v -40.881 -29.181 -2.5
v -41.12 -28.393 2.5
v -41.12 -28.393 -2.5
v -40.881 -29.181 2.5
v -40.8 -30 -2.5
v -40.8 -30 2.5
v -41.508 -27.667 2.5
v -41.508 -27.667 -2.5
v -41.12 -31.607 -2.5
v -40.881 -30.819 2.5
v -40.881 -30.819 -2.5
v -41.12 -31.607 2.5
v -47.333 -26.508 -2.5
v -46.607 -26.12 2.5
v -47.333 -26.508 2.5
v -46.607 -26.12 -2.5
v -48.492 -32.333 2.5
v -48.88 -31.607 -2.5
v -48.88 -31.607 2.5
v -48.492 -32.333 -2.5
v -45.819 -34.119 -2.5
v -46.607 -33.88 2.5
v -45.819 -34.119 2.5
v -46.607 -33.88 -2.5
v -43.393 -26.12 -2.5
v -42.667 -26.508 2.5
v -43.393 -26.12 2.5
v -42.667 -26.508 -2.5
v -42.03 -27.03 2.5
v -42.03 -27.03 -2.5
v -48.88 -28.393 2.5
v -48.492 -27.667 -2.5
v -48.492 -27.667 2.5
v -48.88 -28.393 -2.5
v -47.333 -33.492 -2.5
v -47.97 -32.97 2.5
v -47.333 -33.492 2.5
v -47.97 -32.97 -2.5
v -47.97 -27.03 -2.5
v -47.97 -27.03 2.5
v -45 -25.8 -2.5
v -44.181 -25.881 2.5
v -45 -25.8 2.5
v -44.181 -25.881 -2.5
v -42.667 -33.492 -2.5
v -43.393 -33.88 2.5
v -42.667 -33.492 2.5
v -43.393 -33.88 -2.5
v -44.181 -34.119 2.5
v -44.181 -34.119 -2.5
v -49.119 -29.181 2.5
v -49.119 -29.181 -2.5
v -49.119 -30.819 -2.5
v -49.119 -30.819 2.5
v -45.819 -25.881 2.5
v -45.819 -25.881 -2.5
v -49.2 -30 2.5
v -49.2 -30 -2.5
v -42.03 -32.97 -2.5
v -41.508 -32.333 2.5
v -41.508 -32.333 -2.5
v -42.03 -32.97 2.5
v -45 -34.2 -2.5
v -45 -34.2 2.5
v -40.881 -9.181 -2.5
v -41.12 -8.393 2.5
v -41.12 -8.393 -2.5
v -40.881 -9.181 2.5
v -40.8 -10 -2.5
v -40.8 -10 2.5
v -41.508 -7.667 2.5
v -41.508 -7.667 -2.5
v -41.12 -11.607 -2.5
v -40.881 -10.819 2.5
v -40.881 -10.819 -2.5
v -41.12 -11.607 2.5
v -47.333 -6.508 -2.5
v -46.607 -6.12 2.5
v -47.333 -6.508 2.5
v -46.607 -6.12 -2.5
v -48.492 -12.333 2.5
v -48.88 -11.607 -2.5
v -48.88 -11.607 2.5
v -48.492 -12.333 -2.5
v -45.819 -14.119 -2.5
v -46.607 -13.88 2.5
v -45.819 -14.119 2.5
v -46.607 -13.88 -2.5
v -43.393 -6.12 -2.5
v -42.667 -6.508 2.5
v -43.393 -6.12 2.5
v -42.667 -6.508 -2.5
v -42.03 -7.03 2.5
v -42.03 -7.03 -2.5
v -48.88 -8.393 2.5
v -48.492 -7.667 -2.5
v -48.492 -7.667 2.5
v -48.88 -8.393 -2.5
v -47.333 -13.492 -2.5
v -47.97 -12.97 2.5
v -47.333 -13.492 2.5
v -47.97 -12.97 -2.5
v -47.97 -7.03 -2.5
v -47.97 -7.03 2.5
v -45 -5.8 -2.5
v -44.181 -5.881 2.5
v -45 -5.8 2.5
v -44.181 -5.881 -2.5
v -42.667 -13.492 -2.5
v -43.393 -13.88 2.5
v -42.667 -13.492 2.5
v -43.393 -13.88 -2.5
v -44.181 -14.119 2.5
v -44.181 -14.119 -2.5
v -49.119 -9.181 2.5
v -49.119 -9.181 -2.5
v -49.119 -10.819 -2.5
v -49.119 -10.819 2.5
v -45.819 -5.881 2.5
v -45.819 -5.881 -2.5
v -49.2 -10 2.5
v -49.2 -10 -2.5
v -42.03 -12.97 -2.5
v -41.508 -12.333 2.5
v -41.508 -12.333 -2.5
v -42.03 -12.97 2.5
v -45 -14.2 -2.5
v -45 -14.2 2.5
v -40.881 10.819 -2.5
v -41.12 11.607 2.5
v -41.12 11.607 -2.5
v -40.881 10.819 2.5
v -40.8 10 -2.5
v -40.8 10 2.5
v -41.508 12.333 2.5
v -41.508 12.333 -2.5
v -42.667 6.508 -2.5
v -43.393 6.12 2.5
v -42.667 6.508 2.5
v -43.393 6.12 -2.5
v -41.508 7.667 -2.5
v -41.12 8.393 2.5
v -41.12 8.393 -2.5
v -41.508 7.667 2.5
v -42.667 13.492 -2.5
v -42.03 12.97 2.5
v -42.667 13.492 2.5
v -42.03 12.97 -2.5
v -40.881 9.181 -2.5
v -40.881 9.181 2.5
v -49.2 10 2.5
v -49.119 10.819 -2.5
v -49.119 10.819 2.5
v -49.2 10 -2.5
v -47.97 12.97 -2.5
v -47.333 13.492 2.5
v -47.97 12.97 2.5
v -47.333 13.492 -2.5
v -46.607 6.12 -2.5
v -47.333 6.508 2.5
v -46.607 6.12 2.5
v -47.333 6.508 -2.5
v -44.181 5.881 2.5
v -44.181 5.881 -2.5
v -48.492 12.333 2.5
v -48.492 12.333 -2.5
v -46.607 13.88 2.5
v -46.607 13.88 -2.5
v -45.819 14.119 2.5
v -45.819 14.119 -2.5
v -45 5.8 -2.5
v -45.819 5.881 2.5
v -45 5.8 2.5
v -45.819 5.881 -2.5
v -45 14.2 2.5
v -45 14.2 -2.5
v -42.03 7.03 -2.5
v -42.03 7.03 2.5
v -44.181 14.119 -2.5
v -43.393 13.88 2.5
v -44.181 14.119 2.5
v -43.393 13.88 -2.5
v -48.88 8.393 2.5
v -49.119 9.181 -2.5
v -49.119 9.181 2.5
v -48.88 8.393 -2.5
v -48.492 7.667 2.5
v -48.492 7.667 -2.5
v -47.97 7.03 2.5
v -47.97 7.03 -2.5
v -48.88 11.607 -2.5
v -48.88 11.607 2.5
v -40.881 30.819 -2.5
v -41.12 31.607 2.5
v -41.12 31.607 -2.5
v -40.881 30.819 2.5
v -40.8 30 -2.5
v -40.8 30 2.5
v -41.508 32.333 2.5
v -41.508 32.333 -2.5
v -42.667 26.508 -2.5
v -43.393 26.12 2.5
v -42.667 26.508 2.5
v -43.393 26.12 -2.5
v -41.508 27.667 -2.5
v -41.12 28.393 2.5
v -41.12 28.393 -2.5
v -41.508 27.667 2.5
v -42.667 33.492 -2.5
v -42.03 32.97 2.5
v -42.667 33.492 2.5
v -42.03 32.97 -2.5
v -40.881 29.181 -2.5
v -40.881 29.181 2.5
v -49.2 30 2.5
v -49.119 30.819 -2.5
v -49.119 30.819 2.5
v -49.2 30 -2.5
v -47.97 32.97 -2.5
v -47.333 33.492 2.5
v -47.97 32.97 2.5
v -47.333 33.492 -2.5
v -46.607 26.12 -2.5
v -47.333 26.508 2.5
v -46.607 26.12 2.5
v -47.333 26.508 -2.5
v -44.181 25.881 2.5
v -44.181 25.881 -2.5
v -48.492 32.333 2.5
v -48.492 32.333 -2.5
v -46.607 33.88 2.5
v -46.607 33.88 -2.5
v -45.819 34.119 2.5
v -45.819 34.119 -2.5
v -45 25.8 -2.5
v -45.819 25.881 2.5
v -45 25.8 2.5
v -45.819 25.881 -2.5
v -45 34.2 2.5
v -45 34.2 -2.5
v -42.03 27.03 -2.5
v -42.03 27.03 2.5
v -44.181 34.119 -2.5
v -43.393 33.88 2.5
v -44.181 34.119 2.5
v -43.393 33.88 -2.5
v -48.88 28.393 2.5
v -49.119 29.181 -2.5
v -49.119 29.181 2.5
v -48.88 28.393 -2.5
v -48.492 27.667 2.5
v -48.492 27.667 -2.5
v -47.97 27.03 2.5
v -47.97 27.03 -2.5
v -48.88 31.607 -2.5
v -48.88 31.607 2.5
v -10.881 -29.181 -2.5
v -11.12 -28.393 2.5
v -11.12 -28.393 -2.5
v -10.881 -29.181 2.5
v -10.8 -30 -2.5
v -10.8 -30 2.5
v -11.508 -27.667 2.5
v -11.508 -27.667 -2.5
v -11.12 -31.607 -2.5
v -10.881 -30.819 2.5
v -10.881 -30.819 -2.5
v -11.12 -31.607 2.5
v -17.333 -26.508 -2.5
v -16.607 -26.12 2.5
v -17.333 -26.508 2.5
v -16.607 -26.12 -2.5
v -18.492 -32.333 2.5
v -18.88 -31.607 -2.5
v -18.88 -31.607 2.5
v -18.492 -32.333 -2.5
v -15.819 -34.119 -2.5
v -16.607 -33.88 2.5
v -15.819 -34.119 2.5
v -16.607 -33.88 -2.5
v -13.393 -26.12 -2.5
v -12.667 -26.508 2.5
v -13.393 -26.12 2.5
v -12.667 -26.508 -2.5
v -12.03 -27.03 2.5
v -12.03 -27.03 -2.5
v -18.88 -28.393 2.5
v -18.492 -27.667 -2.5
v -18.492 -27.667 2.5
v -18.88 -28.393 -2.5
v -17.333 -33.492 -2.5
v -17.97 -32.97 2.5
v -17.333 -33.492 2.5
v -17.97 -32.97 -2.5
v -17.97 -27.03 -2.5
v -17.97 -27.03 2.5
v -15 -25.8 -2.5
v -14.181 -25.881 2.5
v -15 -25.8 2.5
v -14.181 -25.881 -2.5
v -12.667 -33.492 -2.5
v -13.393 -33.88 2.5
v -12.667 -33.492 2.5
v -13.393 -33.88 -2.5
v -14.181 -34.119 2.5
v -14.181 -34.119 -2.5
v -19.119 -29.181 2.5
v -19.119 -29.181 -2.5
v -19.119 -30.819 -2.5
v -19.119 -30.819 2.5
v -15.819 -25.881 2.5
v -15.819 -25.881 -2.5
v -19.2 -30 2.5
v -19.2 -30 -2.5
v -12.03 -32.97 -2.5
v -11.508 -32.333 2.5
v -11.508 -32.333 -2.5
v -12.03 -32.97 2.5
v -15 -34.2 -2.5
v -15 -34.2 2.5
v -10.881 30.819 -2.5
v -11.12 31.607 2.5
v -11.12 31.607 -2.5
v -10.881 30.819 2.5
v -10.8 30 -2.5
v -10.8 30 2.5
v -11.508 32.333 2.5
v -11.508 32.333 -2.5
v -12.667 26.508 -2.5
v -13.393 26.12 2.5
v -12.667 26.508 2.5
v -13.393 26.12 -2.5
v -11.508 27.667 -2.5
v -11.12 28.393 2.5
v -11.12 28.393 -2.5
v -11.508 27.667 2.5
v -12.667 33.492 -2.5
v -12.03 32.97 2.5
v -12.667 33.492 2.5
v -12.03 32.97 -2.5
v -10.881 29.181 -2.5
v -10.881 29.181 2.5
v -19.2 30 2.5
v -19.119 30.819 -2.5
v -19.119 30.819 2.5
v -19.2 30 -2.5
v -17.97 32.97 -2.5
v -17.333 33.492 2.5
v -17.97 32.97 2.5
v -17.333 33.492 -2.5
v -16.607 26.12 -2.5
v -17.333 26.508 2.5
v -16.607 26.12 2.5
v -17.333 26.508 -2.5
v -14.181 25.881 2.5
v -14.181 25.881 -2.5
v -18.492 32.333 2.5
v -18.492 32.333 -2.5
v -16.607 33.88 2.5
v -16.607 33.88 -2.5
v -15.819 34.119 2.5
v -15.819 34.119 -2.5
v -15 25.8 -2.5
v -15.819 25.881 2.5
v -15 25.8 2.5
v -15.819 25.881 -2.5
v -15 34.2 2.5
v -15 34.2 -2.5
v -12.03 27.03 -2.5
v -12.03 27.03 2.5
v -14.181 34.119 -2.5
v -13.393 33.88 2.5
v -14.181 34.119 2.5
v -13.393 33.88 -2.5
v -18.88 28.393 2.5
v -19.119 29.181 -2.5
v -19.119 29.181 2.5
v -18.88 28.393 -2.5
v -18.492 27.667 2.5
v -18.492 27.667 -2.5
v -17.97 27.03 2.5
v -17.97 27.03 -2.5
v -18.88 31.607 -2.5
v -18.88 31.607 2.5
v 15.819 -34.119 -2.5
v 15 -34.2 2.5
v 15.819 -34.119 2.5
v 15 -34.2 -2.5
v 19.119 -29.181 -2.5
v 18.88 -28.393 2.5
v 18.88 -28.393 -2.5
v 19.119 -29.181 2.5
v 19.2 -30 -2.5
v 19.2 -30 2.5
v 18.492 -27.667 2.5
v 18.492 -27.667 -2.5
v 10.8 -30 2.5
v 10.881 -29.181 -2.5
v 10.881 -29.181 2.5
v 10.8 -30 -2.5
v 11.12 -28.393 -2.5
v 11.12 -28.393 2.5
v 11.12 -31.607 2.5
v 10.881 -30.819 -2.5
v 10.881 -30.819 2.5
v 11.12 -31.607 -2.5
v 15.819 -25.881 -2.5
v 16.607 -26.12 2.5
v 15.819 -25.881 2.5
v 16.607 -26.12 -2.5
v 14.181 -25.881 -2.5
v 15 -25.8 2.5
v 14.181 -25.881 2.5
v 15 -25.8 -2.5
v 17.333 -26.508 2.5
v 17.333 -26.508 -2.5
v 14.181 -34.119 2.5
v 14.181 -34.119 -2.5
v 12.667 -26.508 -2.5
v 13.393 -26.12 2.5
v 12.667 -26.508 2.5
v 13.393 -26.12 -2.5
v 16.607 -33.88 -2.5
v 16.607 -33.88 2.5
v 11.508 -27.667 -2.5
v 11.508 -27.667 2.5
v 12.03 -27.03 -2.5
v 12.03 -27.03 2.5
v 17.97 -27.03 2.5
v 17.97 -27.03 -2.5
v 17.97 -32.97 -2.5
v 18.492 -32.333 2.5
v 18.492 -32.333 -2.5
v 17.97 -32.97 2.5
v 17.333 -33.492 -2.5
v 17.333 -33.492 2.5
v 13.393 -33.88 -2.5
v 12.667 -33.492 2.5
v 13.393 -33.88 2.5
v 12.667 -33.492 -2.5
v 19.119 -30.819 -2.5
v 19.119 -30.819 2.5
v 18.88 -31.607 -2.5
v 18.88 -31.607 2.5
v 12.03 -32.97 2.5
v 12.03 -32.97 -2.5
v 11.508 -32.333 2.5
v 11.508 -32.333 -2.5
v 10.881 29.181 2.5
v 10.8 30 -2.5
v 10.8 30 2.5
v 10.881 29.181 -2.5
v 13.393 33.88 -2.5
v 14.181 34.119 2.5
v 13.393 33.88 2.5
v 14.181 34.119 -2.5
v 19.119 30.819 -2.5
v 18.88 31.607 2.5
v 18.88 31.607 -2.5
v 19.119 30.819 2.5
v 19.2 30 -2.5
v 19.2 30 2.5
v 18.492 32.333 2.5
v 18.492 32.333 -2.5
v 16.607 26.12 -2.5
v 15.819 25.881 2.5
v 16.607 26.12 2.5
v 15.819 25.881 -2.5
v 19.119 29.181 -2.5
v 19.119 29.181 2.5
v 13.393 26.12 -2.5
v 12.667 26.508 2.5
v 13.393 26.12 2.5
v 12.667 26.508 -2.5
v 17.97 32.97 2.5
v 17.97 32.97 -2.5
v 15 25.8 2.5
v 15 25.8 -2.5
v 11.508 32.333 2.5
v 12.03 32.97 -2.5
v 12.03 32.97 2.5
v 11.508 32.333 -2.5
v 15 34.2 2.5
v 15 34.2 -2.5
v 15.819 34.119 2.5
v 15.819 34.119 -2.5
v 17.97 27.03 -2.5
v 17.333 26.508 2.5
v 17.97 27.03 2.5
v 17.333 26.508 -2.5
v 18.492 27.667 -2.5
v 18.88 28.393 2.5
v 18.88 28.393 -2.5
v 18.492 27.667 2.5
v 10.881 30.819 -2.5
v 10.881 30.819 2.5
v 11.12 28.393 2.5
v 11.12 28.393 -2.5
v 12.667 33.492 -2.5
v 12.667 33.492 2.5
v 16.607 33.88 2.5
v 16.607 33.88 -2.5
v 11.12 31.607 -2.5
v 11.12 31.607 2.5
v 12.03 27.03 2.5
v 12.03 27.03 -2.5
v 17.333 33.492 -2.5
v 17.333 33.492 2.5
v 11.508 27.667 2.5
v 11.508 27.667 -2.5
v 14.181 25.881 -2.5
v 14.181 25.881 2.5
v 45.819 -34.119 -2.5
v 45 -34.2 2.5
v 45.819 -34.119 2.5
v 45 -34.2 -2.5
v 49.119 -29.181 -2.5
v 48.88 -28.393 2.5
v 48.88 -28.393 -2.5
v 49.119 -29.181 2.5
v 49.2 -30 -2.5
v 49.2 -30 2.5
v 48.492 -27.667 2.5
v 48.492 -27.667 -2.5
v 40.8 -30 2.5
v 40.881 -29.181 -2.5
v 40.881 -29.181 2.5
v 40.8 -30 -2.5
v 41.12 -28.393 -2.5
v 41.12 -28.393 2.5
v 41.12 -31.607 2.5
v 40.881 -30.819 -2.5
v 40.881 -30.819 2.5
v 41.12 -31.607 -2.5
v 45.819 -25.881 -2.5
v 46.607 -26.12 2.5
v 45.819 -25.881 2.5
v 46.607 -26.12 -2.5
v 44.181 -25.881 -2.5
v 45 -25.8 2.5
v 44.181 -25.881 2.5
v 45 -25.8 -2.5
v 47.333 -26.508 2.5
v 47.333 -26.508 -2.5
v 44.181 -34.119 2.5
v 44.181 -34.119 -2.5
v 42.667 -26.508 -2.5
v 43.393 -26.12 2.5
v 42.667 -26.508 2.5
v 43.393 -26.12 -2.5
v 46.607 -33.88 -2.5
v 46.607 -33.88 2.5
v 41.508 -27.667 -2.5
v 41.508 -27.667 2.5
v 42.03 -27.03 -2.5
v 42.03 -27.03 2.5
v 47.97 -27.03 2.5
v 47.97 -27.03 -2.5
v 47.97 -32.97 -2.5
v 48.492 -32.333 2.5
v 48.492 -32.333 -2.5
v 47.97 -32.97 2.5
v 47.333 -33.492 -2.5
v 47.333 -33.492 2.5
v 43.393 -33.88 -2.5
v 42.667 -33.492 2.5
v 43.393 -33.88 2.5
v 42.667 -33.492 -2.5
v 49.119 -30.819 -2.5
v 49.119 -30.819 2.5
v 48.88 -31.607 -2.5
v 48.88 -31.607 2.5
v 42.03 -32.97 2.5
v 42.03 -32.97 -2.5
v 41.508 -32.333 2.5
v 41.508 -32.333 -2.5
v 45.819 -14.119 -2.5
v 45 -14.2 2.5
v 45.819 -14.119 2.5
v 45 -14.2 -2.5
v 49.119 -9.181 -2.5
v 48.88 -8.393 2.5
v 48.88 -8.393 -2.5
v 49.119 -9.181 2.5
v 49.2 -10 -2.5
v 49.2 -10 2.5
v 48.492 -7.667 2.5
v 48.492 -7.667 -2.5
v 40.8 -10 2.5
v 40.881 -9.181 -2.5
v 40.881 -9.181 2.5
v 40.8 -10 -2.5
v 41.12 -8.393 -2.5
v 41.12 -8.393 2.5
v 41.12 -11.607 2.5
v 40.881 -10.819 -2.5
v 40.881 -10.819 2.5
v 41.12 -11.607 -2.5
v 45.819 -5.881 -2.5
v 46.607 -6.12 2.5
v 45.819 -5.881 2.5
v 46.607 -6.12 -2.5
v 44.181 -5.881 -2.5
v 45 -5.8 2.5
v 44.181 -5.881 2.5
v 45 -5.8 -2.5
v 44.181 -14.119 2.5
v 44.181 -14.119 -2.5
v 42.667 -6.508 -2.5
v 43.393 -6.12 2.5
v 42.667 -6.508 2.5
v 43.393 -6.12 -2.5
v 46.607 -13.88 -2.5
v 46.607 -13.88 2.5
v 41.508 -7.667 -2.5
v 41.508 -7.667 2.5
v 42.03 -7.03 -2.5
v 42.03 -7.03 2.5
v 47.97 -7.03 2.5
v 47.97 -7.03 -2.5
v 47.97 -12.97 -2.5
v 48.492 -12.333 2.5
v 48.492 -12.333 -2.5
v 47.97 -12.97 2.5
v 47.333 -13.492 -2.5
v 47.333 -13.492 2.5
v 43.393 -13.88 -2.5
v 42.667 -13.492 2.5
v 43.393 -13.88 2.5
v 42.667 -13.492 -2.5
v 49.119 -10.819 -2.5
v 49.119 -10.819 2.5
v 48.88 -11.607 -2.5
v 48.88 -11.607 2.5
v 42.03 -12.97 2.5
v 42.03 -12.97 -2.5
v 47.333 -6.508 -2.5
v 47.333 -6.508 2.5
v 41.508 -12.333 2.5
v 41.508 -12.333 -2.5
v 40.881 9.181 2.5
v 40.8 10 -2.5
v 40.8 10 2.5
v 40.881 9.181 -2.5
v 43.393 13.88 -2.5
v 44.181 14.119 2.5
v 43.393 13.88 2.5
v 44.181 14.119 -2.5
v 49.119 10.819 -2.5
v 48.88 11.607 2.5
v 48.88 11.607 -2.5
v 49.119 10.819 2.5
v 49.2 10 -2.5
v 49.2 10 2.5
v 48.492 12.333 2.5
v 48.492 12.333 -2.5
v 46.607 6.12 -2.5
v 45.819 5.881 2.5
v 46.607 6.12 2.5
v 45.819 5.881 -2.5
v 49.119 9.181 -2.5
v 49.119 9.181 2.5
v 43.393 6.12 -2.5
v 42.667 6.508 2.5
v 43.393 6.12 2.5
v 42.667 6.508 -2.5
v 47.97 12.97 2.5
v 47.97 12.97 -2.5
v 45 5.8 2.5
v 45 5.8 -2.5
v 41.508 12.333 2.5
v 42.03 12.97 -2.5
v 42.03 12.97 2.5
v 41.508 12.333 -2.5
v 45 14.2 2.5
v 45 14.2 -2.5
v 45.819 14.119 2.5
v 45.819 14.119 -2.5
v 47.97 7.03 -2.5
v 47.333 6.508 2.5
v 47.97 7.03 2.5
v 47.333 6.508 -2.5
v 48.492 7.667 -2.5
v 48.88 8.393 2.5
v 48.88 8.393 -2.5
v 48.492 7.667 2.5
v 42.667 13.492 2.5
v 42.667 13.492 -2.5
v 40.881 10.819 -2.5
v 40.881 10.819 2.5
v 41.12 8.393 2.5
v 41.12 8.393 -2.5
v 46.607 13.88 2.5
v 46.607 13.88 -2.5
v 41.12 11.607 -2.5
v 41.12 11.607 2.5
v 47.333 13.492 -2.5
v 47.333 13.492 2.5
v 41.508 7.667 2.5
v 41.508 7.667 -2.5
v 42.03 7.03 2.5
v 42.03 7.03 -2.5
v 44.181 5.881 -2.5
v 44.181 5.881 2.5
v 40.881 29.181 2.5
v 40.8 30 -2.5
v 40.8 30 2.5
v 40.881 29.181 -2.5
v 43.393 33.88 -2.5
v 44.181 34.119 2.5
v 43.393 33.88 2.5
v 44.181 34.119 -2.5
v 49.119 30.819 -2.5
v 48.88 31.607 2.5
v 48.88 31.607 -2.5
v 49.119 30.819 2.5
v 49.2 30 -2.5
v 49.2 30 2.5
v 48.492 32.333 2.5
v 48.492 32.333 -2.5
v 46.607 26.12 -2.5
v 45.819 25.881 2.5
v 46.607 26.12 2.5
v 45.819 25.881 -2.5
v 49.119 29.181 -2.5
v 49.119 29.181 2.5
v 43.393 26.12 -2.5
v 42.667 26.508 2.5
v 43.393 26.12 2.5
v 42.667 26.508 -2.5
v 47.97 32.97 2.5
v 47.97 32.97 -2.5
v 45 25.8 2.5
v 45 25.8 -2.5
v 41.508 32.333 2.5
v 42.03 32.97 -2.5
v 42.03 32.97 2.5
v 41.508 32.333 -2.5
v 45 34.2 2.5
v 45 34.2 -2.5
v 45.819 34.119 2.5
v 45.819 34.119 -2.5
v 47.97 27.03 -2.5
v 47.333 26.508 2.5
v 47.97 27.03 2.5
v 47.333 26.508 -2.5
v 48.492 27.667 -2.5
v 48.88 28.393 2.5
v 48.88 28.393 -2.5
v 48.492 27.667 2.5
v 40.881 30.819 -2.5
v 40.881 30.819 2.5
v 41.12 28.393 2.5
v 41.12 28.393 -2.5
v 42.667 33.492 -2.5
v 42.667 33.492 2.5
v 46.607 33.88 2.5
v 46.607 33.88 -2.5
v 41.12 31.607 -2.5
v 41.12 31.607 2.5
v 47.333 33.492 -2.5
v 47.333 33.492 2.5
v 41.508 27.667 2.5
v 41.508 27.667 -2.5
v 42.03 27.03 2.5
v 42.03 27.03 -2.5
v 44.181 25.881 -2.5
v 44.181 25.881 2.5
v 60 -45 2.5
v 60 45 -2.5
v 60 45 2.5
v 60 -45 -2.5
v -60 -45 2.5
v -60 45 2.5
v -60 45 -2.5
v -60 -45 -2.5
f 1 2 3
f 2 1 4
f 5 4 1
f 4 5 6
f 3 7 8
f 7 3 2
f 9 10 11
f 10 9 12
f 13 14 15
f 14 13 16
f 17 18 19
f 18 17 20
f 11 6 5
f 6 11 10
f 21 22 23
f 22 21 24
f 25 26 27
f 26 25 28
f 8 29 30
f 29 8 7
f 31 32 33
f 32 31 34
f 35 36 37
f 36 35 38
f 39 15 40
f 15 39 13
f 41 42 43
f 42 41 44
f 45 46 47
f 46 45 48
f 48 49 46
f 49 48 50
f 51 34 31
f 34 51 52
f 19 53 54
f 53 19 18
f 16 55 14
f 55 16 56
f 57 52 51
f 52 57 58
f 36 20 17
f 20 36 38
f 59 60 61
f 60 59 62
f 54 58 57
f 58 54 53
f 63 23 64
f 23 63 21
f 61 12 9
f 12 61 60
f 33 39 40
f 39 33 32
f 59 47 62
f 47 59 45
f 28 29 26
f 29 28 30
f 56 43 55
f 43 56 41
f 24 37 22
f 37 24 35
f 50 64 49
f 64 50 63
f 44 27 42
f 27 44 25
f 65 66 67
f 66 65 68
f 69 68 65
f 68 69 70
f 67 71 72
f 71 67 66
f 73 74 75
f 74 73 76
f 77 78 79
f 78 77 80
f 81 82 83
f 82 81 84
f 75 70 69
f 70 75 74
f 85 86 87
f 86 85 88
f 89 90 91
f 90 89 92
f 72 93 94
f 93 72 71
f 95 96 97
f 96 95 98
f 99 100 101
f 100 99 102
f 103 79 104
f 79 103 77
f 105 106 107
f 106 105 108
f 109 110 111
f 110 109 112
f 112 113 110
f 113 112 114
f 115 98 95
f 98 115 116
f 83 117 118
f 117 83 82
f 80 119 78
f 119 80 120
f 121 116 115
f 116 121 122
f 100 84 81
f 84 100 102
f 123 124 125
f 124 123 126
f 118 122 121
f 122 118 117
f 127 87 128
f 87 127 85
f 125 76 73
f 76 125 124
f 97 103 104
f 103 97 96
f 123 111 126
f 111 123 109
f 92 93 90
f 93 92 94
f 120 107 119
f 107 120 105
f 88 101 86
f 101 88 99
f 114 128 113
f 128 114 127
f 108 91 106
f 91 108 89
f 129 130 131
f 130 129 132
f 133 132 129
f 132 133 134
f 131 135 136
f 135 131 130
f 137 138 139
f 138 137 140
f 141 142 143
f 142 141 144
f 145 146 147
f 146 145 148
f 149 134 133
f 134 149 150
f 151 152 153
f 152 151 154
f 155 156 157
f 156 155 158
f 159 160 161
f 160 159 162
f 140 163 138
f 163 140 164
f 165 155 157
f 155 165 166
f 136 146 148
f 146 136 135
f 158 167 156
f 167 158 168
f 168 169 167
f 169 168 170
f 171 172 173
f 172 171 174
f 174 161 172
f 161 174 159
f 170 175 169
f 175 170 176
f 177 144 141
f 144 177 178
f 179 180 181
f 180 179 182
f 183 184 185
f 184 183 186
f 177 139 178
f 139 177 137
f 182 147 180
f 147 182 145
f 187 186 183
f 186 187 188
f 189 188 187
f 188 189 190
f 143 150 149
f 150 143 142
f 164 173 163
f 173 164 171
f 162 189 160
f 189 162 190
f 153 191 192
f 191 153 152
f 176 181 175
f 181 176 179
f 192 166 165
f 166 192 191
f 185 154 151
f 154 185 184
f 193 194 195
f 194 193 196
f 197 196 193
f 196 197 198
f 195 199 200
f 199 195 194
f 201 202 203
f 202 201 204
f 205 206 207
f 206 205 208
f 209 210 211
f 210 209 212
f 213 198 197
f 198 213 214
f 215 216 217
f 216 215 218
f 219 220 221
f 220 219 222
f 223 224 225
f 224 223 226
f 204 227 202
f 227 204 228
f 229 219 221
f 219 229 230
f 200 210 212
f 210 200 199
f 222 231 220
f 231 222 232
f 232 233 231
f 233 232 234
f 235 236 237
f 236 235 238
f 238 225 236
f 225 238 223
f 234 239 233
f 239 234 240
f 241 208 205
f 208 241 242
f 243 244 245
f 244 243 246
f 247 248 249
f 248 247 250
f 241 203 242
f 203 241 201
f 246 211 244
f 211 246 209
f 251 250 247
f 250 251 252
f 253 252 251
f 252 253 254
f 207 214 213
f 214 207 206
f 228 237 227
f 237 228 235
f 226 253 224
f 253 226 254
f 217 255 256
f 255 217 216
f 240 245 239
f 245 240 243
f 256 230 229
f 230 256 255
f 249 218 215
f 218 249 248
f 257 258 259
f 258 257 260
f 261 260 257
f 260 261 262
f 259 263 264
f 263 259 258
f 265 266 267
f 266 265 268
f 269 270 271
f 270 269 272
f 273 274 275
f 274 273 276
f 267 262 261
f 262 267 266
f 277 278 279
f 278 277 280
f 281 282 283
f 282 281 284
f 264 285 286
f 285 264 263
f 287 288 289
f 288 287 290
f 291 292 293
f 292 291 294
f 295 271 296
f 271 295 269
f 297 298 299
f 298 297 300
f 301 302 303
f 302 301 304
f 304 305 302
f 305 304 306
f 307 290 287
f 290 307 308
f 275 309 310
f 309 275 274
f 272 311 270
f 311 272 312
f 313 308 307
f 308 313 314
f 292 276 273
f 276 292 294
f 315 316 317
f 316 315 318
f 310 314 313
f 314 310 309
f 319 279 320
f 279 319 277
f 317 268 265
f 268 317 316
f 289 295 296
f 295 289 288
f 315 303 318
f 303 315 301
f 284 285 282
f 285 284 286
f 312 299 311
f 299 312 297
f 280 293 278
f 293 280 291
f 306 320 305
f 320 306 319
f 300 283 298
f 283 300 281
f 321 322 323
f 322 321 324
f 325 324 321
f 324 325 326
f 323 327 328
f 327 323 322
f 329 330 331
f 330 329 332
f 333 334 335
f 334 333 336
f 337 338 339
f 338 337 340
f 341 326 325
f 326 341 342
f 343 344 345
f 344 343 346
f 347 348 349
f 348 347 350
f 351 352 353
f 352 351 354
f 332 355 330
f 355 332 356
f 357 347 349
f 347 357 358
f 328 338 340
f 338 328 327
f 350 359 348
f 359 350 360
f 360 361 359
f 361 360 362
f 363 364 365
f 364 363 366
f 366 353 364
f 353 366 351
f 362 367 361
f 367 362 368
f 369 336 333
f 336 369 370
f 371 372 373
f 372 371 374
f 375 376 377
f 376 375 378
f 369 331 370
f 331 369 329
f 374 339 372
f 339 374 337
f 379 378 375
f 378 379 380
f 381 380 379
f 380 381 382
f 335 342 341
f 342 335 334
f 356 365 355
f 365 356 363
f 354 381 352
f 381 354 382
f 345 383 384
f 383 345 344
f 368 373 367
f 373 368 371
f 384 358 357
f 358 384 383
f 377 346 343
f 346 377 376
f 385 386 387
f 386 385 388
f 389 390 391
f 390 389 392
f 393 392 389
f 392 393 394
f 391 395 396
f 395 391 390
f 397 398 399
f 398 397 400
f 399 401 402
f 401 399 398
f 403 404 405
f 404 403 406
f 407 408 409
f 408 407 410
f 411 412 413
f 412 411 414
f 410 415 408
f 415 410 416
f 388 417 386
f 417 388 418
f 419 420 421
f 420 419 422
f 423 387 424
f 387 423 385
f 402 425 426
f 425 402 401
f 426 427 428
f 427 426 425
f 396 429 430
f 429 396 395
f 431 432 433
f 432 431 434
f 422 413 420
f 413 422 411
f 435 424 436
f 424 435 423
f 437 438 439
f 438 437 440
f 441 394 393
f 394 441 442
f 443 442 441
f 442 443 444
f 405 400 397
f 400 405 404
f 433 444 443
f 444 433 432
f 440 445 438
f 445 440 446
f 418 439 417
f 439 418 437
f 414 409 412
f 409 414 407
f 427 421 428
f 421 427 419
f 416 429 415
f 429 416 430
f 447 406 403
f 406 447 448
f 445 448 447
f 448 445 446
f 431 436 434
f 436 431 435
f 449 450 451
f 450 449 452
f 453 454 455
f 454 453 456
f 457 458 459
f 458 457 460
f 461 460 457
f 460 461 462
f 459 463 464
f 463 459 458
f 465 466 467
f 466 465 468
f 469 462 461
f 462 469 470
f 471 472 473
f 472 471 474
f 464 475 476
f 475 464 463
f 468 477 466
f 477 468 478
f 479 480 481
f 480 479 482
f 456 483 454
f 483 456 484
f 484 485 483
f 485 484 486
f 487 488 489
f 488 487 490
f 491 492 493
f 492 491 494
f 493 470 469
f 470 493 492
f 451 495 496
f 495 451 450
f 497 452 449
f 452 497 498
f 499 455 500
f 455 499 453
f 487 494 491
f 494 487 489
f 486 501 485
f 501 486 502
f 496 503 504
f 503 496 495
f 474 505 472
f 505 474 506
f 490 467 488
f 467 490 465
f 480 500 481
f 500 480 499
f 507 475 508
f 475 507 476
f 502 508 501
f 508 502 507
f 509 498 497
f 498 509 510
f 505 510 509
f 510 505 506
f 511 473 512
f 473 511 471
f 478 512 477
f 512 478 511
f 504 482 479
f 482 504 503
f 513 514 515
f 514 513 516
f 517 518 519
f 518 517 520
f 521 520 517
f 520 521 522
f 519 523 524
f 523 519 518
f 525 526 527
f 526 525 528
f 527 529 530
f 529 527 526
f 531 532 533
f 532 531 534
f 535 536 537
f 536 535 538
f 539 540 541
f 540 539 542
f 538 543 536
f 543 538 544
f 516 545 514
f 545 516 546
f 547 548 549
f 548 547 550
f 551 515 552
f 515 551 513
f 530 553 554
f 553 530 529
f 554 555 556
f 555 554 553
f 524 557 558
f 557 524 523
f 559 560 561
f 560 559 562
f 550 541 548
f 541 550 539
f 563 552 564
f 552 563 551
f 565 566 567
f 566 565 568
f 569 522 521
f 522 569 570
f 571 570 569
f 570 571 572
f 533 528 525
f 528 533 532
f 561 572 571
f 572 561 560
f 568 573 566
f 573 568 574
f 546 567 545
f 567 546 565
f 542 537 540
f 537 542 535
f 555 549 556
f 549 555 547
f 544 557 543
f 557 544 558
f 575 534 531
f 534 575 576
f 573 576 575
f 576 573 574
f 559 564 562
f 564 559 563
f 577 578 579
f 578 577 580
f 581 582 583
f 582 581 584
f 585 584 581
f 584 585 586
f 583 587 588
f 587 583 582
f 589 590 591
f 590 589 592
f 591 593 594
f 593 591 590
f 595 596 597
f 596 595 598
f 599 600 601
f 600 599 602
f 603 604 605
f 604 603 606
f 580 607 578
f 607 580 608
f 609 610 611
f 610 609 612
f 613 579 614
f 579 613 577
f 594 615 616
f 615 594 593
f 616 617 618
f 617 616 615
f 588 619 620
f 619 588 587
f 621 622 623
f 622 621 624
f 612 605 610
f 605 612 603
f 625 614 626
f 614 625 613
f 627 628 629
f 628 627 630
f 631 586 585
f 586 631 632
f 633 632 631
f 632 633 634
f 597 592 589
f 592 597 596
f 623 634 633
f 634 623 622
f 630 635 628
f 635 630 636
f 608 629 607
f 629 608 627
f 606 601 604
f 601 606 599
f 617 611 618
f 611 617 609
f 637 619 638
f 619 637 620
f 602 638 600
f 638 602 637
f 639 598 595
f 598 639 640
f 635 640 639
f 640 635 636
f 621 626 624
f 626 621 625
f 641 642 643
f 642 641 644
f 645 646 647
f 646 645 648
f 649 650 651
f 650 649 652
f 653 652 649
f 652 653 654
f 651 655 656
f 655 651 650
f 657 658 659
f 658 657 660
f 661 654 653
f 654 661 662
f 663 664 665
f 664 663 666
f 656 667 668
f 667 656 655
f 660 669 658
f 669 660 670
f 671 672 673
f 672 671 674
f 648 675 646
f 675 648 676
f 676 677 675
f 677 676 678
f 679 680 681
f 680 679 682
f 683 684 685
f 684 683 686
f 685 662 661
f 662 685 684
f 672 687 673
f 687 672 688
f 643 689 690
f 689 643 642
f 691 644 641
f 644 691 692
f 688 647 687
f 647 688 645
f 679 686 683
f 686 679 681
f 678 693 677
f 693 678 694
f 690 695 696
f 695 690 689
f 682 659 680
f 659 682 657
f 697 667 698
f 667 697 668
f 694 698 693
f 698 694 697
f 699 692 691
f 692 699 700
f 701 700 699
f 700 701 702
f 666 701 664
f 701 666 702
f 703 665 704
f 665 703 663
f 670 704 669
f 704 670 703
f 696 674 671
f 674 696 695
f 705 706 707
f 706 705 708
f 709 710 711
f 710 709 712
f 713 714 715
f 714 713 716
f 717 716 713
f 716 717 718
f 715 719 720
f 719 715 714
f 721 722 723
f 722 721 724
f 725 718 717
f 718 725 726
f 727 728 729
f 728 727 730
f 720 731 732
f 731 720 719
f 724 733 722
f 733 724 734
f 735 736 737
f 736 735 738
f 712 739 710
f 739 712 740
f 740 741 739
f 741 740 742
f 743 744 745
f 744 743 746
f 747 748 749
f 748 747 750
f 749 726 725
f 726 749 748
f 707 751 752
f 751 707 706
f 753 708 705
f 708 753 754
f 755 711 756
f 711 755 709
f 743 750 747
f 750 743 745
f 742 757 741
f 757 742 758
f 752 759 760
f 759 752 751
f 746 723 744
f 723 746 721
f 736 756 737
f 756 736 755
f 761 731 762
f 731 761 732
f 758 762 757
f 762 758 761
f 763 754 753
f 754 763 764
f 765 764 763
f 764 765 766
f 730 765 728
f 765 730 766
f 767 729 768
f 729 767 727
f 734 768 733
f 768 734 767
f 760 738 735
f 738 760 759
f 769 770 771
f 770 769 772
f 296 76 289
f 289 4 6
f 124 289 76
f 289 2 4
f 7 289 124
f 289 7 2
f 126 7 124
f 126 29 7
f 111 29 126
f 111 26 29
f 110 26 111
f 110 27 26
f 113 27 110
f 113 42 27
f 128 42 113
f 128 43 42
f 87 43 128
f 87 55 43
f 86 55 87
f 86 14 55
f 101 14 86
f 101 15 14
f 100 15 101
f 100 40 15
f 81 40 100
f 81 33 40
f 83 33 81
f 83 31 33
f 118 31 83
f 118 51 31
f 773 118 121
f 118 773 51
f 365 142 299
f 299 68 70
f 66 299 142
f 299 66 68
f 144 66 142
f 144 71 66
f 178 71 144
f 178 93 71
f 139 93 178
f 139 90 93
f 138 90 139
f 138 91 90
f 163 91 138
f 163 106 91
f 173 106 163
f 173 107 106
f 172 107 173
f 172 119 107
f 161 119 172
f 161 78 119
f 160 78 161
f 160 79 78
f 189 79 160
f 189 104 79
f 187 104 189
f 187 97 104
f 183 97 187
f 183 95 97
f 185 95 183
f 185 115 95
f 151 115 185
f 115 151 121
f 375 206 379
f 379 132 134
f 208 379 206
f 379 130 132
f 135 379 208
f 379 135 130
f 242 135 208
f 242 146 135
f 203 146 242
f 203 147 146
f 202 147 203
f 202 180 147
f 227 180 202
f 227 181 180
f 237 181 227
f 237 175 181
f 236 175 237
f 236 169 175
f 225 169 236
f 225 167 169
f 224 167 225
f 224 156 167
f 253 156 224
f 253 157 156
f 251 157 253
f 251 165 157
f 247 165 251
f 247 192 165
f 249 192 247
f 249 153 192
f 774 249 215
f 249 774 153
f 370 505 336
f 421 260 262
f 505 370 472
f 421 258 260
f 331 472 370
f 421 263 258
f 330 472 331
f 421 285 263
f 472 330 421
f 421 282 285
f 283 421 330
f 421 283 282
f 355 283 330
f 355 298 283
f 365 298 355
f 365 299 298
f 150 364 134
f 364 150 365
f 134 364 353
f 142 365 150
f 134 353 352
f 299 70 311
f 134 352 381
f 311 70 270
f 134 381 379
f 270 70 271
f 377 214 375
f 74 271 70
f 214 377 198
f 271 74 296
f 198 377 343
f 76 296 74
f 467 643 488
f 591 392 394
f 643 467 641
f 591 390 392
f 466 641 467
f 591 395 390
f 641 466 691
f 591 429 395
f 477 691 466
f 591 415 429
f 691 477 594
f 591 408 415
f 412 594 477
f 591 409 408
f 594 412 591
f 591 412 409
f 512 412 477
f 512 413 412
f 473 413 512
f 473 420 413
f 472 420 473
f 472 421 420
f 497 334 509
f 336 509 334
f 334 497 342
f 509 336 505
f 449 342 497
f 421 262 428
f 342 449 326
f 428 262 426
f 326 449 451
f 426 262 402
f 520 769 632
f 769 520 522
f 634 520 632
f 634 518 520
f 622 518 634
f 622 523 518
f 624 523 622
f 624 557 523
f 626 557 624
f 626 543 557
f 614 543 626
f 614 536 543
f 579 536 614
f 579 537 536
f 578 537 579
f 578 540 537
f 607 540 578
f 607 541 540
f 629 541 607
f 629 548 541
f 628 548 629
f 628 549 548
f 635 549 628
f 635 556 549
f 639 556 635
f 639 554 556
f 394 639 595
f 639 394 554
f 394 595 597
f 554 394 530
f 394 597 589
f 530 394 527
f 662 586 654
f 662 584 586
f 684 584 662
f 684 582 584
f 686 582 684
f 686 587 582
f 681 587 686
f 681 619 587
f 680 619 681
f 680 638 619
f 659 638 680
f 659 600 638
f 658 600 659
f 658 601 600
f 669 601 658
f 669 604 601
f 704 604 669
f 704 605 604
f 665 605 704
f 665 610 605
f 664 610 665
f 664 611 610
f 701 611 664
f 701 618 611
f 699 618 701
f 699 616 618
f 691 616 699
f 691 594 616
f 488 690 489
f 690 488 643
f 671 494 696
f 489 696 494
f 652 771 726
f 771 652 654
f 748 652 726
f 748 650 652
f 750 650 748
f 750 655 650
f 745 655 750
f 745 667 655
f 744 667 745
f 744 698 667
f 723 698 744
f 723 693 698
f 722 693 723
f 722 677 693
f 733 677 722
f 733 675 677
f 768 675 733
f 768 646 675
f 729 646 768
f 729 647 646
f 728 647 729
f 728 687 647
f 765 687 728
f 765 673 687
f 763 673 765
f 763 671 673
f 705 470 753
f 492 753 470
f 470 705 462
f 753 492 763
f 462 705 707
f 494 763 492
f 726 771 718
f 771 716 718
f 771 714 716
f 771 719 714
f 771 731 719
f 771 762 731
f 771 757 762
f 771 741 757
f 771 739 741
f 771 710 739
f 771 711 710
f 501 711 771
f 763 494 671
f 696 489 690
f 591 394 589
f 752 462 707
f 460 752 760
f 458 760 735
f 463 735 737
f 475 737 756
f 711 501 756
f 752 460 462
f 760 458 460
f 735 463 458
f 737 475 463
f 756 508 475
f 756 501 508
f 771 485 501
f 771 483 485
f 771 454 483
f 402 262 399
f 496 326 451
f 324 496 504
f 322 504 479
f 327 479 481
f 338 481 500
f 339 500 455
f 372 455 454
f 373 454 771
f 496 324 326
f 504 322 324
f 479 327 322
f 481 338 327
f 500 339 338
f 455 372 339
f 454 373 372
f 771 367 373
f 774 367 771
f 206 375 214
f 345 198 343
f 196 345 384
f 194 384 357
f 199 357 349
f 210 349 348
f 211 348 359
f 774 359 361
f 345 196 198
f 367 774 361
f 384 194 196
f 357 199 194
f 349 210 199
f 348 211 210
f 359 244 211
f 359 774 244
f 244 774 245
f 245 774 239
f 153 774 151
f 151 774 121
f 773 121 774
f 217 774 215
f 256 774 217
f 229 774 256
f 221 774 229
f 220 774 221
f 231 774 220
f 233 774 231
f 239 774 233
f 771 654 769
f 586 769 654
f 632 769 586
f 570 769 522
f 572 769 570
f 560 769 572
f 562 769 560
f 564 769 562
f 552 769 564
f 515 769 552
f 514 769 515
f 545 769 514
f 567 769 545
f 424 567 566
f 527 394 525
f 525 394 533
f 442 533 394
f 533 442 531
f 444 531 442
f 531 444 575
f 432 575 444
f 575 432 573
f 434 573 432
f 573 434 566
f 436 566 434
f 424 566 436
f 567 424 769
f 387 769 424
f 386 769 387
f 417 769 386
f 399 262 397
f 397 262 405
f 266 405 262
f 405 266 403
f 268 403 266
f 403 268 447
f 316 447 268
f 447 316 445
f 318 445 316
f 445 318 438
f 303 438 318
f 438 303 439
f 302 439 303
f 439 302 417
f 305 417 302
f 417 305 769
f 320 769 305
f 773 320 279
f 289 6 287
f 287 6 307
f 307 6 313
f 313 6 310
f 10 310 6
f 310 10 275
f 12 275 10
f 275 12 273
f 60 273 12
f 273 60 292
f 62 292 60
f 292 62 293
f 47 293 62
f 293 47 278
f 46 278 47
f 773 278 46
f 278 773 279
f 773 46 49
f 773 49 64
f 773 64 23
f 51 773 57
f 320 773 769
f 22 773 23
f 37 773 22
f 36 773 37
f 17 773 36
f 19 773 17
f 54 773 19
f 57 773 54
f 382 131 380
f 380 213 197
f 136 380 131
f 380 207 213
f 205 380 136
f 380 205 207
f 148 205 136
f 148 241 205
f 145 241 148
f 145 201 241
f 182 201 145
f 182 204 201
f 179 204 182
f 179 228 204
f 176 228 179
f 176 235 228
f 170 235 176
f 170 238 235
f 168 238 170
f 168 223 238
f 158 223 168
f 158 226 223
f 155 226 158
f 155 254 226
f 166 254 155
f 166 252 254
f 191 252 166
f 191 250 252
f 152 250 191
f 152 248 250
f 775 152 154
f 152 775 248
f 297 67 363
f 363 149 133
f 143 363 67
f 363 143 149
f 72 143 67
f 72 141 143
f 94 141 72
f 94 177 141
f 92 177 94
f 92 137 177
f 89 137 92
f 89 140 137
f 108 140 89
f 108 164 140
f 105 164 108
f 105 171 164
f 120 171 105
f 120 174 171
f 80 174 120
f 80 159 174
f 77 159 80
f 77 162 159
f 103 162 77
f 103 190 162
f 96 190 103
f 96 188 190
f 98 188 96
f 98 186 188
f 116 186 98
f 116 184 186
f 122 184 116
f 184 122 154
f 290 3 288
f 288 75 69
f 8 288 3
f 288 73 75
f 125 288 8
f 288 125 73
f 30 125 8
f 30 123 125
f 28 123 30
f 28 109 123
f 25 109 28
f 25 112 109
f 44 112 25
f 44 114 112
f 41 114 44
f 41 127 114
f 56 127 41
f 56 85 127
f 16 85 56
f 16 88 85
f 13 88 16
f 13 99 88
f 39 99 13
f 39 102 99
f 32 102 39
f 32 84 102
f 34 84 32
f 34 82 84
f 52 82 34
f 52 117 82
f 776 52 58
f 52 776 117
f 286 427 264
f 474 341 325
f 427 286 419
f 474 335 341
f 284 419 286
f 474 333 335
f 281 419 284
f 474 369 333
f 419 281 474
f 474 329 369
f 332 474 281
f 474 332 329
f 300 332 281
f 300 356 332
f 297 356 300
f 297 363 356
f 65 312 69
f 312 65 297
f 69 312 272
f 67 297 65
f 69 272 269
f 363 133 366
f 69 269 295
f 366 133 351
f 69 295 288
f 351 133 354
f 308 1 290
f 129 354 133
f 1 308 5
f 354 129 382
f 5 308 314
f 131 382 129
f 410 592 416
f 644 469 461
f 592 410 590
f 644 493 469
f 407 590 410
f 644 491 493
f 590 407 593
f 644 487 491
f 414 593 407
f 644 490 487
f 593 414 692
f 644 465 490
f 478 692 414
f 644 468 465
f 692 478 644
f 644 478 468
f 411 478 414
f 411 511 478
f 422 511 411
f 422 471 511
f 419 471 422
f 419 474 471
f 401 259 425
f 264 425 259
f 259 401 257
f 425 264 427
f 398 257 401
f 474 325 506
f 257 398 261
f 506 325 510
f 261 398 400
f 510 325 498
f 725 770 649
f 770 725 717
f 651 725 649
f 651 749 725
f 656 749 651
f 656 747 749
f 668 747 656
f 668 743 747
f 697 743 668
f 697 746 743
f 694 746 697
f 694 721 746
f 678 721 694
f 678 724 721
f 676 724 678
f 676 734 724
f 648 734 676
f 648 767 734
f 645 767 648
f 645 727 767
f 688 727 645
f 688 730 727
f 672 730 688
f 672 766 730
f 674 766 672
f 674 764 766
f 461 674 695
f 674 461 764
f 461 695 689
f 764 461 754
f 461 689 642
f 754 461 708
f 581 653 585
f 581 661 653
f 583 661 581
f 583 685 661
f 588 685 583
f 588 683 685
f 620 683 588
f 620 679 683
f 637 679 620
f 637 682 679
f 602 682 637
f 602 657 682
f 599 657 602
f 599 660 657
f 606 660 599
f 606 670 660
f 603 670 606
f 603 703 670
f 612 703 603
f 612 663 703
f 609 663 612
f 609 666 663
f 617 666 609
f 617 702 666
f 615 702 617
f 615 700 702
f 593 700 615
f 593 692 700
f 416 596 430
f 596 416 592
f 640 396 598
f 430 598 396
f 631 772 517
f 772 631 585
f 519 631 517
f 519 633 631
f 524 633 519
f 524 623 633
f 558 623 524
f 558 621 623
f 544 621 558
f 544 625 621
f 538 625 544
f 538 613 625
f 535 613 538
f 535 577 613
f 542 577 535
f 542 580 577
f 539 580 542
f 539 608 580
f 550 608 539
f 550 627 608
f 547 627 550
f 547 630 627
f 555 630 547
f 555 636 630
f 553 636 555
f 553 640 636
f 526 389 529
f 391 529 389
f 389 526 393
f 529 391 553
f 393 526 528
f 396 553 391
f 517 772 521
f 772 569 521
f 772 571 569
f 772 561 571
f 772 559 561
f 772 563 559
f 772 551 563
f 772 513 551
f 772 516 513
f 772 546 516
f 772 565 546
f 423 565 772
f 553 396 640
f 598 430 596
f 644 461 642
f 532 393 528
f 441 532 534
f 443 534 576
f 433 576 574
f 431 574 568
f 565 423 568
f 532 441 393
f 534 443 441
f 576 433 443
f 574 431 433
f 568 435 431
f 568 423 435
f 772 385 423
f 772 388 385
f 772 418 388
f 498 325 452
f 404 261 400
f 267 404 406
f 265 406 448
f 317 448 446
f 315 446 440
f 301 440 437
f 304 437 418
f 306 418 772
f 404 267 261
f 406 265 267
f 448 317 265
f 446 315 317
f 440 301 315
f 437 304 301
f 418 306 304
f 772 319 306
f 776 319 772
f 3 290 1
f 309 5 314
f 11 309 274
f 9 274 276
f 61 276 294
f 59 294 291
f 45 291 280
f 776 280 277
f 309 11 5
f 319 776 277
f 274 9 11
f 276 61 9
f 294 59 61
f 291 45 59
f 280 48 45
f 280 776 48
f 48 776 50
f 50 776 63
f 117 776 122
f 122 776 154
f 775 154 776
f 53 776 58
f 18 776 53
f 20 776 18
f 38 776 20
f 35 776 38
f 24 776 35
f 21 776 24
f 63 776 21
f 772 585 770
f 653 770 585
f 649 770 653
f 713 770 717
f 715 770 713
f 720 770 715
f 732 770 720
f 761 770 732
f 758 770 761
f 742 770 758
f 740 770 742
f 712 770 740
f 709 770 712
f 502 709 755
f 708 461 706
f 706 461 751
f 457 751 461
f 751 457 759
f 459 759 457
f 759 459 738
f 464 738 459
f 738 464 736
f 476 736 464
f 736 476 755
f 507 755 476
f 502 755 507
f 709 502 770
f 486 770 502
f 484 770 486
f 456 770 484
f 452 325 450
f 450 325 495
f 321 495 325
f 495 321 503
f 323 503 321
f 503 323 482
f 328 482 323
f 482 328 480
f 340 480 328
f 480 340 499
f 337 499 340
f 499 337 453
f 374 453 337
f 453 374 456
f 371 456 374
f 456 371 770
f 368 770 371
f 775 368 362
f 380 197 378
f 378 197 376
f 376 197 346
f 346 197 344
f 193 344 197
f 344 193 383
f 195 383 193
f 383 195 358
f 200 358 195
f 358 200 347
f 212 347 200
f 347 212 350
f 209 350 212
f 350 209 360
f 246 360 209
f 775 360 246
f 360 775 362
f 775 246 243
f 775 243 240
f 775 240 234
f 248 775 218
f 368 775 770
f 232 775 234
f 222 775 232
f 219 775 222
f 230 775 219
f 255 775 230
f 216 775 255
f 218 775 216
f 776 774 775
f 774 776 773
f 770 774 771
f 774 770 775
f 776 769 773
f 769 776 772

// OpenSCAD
$fn = 32;

// ----------------------------------------------------------------------
// Perforated panel 120 x 90 x 5
// 4 x 4 Ø8.4 holes, frame layout
// ----------------------------------------------------------------------

// --- parameters (mm) ---
panel = [120, 90, 5];  // overall size (x, y, z)
hole_d = 8.4;          // hole diameter
pitch_x = 30;          // hole pitch along X
pitch_y = 20;          // hole pitch along Y

// --- derived feature positions (mm) ---
margin = hole_d / 2 + 2;            // = 6.2   clearance from the panel edge
cols = floor((panel[0] - 2 * margin) / pitch_x) + 1;  // = 4   how many columns fit in X
rows = floor((panel[1] - 2 * margin) / pitch_y) + 1;  // = 4   how many rows fit in Y
span_x = (cols - 1) * pitch_x + 0;  // = 90   width of the field
span_y = (rows - 1) * pitch_y;      // = 60   height of the field
origin_x = -span_x / 2;             // = -45   X of the first hole
origin_y = -span_y / 2;             // = -30   Y of the first row
holes = 2 * cols + 2 * (rows - 2);  // = 12   holes around the frame
feature_centers = [
  [origin_x + 0 * pitch_x, origin_y + 0 * pitch_y],
  [origin_x + 0 * pitch_x, origin_y + 1 * pitch_y],
  [origin_x + 0 * pitch_x, origin_y + 2 * pitch_y],
  [origin_x + 0 * pitch_x, origin_y + 3 * pitch_y],
  [origin_x + 1 * pitch_x, origin_y + 0 * pitch_y],
  [origin_x + 1 * pitch_x, origin_y + 3 * pitch_y],
  [origin_x + 2 * pitch_x, origin_y + 0 * pitch_y],
  [origin_x + 2 * pitch_x, origin_y + 3 * pitch_y],
  [origin_x + 3 * pitch_x, origin_y + 0 * pitch_y],
  [origin_x + 3 * pitch_x, origin_y + 1 * pitch_y],
  [origin_x + 3 * pitch_x, origin_y + 2 * pitch_y],
  [origin_x + 3 * pitch_x, origin_y + 3 * pitch_y]
];   // hole centres, used verbatim by the cutter loop

// panel outline, every hole through
difference() {
  cube(panel, center = true);
  for (centre = feature_centers)
    translate([centre[0], centre[1], 0])
      cylinder(d = hole_d, h = panel[2] + 2, center = true);
}
